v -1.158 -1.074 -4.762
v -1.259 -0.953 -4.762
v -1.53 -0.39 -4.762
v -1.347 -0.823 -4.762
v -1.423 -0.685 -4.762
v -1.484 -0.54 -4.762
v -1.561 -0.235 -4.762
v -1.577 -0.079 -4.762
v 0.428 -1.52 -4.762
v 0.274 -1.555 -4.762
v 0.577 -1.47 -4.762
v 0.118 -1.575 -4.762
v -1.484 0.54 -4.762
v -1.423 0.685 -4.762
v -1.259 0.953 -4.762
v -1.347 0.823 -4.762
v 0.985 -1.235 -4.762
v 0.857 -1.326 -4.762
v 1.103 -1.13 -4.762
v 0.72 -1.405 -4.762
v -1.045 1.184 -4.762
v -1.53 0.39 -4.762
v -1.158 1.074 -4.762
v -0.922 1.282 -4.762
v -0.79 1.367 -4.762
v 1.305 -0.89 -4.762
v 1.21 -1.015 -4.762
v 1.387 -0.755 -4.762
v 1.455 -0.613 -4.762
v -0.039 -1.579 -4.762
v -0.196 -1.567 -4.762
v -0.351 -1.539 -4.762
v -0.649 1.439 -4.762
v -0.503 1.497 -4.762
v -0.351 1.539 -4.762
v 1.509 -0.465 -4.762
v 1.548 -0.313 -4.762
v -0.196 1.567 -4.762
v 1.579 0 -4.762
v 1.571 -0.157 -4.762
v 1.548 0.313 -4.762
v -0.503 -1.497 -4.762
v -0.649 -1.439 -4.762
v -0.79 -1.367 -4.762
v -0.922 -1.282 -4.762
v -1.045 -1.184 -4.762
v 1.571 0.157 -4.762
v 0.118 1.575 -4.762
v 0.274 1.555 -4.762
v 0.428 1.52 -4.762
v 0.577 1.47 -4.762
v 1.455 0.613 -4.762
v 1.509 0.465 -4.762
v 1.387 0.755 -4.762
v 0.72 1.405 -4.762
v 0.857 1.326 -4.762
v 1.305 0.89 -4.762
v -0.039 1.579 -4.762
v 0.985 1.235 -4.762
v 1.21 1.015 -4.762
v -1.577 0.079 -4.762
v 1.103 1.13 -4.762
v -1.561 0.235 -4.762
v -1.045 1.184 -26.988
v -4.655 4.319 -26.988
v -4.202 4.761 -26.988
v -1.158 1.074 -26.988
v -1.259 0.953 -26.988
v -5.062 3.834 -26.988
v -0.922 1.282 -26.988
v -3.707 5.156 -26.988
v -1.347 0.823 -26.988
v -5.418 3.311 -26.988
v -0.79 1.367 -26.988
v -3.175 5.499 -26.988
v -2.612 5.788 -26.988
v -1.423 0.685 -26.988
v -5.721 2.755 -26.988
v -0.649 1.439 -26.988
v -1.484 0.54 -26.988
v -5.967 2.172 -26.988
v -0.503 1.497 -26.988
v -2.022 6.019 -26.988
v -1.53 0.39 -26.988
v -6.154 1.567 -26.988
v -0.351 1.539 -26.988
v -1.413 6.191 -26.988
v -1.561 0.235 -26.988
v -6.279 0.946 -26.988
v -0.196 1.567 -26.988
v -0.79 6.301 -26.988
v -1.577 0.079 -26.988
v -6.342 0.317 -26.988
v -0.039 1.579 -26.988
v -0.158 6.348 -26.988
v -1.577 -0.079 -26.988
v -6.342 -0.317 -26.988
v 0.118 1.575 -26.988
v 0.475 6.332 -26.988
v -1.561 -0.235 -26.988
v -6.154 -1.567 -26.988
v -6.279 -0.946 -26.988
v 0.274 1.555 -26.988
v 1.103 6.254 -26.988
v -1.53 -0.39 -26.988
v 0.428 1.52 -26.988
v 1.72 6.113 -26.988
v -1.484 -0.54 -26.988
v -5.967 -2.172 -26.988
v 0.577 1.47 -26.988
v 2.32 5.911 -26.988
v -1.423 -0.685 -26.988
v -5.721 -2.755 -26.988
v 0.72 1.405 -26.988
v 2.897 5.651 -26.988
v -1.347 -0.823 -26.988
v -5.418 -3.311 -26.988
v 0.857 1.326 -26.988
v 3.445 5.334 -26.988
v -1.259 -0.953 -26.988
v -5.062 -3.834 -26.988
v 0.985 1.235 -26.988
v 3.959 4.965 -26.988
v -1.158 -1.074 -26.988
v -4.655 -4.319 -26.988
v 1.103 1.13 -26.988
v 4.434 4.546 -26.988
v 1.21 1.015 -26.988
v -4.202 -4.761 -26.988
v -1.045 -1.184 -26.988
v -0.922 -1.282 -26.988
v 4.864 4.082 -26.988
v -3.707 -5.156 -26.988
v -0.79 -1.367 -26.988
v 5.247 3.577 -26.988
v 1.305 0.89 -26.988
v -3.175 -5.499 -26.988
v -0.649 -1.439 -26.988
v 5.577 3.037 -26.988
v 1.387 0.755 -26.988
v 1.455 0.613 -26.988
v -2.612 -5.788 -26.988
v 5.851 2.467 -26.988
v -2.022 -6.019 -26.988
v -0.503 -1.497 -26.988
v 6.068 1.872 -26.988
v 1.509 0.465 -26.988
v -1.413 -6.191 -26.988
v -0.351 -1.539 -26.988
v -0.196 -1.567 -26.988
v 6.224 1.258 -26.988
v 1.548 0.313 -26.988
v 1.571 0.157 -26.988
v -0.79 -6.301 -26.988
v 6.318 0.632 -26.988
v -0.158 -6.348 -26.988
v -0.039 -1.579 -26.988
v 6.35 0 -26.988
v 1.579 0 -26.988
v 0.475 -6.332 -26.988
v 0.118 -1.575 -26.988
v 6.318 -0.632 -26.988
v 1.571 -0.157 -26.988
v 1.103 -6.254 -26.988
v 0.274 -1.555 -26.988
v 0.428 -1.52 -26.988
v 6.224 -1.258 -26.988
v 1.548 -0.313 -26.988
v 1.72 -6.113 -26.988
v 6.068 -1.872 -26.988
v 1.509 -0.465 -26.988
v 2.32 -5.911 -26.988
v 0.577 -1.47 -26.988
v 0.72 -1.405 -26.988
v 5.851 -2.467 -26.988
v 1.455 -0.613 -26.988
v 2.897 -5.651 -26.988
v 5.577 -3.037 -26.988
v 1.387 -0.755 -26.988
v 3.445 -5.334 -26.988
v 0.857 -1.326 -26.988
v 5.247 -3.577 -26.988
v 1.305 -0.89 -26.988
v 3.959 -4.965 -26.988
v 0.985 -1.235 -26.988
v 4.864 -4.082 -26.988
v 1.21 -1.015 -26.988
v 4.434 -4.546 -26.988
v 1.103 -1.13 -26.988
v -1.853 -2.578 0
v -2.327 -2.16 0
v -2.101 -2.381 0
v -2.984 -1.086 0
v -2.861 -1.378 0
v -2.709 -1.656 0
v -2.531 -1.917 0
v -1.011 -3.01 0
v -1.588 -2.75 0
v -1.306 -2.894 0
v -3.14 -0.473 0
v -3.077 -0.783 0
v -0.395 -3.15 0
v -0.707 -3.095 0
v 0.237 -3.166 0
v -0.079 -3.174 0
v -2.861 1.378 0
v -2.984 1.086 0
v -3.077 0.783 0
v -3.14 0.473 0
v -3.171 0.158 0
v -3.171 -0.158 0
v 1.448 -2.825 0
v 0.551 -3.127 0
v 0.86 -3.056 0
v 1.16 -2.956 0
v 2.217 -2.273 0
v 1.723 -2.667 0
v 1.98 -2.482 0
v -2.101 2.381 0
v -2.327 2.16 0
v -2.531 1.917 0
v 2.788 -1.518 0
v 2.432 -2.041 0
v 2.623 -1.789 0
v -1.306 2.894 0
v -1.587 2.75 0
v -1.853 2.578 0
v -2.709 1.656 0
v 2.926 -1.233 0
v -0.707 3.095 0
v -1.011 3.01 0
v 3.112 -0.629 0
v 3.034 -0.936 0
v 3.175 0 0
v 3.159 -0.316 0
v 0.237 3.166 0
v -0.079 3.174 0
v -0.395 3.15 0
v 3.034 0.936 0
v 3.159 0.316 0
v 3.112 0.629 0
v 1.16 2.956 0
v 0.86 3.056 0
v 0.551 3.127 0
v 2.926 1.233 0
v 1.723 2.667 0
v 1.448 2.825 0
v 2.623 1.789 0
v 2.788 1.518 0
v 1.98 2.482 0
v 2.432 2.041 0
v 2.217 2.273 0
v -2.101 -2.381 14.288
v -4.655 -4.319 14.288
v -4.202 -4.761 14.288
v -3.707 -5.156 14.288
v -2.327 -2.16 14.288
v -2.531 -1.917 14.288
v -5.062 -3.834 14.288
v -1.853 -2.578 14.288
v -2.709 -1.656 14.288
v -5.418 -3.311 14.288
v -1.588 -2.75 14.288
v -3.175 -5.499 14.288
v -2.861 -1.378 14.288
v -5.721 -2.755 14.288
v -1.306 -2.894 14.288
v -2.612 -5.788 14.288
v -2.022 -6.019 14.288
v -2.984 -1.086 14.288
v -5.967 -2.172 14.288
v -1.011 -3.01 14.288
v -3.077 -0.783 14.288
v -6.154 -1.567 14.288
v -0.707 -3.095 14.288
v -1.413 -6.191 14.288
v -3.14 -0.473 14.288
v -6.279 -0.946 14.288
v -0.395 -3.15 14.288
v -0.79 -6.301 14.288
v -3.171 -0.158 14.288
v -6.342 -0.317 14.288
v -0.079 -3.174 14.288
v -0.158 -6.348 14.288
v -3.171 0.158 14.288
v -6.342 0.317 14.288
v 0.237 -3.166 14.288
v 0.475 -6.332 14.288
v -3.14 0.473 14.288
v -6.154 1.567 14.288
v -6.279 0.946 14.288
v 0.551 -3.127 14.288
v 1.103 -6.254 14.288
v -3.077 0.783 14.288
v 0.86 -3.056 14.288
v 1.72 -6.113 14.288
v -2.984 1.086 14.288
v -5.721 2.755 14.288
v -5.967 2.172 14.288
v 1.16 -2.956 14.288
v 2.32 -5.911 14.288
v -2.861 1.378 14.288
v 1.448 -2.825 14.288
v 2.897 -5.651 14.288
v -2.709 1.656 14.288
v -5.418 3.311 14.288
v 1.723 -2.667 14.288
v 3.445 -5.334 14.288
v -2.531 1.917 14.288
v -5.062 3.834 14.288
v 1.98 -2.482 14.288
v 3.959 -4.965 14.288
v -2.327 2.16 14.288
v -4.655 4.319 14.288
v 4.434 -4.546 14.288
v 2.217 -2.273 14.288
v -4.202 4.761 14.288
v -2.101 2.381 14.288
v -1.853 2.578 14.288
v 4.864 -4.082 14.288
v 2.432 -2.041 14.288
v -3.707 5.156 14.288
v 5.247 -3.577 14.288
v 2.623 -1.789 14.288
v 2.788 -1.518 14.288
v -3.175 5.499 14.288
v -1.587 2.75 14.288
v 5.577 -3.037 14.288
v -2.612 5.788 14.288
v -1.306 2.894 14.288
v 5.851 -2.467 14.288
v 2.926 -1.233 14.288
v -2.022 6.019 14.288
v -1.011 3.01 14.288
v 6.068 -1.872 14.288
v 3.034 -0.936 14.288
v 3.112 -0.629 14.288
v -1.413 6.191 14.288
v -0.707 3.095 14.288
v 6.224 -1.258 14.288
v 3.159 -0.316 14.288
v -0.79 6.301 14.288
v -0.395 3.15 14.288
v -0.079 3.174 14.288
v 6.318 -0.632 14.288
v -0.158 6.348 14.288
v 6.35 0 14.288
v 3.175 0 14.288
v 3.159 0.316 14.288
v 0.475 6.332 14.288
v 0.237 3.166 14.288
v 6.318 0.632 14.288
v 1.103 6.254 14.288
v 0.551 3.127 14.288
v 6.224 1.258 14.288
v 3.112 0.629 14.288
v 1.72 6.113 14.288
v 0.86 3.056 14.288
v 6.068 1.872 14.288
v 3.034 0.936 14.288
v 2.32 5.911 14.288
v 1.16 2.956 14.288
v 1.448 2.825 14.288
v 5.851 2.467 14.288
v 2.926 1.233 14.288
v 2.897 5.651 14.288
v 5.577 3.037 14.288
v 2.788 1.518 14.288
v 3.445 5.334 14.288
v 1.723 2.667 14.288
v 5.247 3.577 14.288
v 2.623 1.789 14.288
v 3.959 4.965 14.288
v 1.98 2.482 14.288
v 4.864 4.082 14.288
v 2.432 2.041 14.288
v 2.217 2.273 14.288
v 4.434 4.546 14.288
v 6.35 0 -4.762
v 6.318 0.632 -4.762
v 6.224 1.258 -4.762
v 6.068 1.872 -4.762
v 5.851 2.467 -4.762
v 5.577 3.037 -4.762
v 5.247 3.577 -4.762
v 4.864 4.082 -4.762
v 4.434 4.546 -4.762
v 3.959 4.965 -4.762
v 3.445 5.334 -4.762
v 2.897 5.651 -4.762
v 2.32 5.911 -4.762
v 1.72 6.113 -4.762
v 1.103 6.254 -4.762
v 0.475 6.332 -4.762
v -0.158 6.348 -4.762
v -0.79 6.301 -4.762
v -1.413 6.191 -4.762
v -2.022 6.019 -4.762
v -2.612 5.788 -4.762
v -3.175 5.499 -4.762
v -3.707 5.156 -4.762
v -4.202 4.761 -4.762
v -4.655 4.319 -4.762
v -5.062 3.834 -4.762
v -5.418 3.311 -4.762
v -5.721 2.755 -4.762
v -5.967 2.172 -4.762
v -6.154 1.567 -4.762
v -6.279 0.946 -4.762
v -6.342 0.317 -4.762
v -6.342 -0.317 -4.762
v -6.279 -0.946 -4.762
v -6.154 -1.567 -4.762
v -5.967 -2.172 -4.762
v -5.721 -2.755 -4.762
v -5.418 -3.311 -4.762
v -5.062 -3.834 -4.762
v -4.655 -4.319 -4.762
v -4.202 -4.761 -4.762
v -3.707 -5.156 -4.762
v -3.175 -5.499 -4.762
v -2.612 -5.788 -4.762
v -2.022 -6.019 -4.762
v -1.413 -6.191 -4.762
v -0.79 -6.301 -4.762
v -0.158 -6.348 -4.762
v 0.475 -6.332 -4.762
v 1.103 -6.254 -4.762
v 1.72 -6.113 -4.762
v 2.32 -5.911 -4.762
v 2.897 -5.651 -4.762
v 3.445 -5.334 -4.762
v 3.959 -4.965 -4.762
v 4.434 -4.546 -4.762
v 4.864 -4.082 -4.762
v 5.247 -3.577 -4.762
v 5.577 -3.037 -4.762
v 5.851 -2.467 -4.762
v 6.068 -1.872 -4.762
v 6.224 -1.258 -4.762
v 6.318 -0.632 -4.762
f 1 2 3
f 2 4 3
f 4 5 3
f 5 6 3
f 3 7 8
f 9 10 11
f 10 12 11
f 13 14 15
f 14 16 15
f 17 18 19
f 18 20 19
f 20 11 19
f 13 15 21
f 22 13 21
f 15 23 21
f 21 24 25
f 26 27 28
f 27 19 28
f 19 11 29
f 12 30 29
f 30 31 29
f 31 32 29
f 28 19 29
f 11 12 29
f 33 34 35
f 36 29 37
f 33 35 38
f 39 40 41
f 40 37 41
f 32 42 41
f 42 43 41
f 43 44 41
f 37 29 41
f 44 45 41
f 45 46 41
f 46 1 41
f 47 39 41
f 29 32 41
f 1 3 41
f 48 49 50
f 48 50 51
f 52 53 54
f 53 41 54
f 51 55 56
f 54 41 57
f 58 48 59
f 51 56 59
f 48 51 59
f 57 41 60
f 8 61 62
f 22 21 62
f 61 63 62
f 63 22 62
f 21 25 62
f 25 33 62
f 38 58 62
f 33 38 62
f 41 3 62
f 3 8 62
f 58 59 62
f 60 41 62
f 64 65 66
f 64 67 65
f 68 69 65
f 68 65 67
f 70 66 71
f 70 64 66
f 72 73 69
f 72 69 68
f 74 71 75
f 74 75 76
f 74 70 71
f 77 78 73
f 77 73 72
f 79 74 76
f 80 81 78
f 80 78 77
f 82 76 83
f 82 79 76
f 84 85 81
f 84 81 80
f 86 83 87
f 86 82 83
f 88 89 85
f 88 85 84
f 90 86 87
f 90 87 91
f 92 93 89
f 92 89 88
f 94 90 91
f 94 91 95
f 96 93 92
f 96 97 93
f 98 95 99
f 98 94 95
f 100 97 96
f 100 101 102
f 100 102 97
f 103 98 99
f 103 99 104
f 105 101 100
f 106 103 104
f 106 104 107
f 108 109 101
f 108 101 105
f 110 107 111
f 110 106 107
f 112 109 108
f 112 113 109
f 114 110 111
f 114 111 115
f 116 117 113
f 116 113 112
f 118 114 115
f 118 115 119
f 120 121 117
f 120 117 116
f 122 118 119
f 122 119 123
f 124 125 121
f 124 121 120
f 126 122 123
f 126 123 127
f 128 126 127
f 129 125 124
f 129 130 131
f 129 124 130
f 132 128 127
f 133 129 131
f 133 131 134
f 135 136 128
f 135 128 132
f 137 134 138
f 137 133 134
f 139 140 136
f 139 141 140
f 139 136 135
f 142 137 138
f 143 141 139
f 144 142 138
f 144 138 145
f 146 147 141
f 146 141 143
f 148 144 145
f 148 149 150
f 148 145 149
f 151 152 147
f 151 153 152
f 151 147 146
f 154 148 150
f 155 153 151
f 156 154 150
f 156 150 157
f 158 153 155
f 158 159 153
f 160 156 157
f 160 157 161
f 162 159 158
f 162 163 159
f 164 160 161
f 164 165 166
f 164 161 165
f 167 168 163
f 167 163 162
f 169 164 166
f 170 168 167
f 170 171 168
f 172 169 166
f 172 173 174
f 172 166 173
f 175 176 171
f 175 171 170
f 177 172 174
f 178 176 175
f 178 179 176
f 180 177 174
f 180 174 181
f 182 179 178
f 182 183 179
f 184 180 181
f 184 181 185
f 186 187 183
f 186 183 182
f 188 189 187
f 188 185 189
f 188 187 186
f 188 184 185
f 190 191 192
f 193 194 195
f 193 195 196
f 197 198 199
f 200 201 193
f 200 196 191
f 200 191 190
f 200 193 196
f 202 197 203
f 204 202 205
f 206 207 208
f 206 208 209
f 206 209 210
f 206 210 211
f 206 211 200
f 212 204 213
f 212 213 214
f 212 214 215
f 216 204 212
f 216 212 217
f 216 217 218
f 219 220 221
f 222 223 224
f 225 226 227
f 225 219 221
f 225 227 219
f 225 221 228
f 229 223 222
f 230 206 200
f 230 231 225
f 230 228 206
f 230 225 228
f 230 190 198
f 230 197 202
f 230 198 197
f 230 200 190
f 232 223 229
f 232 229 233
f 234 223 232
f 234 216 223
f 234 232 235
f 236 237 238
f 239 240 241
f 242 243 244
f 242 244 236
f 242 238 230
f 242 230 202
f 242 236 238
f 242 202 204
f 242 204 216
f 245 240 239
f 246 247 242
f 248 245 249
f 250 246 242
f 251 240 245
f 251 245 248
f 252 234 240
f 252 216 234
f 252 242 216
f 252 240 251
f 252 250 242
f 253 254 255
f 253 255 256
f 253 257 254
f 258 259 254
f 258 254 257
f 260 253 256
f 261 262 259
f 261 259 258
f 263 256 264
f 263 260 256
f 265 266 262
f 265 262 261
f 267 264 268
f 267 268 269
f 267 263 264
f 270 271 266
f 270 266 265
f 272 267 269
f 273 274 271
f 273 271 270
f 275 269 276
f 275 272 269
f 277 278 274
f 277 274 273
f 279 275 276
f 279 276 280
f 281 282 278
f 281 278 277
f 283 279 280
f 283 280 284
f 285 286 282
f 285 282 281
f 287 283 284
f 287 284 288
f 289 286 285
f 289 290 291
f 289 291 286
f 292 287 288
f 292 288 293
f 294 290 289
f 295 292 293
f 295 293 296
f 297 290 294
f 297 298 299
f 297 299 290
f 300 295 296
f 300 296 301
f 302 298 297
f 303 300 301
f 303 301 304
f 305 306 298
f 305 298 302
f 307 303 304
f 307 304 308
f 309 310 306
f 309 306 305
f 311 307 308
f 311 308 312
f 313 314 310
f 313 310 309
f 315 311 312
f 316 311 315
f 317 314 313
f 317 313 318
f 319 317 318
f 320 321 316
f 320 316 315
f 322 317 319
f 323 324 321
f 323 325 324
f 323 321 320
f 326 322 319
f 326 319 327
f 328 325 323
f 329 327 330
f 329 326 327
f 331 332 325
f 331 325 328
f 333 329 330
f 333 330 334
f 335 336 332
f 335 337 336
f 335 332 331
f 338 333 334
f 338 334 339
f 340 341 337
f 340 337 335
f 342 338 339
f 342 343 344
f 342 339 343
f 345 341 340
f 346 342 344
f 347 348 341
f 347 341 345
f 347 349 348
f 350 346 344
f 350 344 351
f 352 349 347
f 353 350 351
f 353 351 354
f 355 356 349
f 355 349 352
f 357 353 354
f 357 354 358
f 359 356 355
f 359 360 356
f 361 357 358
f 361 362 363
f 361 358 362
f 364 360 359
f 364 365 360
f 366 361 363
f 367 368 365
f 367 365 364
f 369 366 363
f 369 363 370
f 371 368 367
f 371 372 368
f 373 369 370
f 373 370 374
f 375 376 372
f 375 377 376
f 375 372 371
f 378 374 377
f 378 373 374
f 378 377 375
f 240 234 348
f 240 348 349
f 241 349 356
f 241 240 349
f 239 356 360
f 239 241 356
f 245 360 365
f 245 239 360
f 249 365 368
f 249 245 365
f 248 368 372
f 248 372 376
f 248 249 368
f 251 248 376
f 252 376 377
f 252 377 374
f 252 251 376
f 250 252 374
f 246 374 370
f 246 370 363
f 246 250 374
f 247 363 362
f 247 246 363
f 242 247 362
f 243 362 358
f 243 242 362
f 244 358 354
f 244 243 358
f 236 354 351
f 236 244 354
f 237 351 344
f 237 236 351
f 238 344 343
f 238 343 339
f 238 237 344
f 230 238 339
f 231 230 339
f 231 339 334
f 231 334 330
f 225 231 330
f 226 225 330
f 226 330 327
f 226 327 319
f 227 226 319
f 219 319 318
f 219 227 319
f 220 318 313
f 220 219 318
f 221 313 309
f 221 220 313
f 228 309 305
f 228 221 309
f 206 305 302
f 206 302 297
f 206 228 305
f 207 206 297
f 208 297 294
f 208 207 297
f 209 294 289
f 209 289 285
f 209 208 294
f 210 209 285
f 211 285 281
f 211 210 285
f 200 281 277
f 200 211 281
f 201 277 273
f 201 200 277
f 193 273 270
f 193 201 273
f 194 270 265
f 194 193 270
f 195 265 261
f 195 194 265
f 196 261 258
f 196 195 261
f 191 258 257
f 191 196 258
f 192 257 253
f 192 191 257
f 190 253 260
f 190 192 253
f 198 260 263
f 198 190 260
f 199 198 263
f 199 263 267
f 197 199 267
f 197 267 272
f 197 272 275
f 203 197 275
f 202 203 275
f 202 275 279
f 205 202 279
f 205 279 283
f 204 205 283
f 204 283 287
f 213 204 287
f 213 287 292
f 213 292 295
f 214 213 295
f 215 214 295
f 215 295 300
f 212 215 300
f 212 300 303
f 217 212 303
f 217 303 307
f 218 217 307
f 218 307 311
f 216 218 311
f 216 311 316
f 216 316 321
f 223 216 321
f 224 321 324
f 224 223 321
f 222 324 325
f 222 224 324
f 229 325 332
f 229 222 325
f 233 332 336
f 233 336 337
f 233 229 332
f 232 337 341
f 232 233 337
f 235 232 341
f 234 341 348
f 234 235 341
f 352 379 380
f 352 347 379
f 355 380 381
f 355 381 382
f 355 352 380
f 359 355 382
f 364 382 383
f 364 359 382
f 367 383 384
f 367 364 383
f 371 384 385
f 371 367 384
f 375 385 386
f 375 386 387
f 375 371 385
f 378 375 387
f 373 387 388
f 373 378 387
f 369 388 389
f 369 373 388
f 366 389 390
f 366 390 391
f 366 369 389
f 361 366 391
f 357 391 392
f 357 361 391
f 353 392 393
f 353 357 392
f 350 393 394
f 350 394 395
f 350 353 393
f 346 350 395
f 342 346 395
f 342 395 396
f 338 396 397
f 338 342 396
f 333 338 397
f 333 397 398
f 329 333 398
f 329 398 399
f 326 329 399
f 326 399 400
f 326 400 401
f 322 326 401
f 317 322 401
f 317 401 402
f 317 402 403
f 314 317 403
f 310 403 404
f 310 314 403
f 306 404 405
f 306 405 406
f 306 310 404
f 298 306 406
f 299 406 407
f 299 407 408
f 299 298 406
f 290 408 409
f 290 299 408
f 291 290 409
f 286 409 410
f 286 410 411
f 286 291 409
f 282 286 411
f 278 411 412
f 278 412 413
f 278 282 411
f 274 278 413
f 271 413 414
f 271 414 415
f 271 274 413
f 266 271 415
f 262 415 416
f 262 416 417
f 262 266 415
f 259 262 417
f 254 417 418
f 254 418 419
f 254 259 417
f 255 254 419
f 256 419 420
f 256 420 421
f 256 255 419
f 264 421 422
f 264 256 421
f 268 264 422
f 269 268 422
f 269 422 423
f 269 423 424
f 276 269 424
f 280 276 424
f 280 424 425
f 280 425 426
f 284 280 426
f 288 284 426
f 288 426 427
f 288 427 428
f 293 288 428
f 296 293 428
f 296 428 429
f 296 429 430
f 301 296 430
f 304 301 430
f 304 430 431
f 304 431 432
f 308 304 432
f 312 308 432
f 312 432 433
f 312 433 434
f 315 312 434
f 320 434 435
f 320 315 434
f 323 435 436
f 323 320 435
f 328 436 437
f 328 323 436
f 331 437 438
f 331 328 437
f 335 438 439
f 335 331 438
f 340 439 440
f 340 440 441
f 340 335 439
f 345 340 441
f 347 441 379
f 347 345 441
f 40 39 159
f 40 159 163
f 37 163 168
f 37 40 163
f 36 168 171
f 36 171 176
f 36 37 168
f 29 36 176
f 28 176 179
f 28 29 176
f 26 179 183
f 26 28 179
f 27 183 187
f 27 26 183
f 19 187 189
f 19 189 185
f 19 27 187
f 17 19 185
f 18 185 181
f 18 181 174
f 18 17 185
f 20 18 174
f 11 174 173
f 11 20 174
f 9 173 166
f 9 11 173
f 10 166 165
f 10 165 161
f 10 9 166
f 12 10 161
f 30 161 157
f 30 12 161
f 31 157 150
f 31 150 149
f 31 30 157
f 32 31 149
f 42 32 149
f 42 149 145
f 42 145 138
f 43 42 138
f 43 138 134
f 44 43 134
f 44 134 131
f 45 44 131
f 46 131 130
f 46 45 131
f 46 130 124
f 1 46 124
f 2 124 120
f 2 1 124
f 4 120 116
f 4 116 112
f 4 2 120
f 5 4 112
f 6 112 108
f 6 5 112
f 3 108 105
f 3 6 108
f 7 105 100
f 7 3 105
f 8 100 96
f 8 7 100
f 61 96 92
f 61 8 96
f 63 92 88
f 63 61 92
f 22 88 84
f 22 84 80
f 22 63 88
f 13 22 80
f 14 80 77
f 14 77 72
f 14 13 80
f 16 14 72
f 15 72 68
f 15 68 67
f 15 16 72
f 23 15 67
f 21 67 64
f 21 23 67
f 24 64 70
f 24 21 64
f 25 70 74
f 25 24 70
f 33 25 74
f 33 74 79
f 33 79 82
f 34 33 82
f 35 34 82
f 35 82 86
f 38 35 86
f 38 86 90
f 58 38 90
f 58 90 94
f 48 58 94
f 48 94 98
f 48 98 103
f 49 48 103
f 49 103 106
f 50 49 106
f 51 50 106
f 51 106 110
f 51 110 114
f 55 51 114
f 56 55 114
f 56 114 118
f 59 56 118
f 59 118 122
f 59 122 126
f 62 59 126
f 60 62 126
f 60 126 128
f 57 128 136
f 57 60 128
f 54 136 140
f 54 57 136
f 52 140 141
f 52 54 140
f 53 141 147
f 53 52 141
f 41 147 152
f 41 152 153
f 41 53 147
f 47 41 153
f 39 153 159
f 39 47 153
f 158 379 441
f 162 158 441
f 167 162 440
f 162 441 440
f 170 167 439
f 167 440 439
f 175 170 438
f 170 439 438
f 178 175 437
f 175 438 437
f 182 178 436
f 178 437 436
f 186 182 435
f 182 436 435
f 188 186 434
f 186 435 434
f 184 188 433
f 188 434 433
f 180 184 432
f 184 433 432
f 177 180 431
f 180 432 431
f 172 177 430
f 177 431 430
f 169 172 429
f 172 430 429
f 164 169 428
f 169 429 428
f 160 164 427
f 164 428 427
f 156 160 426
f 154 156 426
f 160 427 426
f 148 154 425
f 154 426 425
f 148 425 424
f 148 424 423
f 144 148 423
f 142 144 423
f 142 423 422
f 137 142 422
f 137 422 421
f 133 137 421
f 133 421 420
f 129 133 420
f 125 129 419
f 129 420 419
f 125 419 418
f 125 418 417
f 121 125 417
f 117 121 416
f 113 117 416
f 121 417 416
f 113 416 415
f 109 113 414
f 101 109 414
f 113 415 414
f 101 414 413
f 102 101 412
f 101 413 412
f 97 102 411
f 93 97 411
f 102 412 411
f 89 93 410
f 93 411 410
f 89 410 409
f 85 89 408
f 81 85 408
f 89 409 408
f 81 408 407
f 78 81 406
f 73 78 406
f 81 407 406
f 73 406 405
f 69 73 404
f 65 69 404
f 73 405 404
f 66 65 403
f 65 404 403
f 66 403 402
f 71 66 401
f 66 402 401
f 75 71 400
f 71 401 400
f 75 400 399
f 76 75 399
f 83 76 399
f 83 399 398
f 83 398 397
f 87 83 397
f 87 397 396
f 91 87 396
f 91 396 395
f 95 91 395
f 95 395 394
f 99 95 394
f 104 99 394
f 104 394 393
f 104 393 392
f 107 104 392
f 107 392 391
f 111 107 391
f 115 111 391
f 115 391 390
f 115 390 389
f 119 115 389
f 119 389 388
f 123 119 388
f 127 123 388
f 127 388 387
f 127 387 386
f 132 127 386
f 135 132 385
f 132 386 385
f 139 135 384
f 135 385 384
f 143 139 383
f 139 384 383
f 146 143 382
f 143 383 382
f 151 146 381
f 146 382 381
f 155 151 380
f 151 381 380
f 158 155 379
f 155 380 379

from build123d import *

# Parameters (mm, degrees)
F0_R     = 6.35
F0_R_2   = 3.175
F1_DEPTH = 14.2875
F2_R     = 6.35
F3_DEPTH = 4.7625
F4_R     = 6.35
F4_R_2   = 1.579033
F5_DEPTH = 22.225


with BuildPart() as f1:
    # F0 (on Top) → F1 (new body)
    with BuildSketch(Plane.XY):
        Circle(F0_R)
        Circle(F0_R_2, mode=Mode.SUBTRACT)
    extrude(amount=F1_DEPTH)

    # F2 (on face) → F3 (join)
    with BuildSketch(Plane.XY):
        Circle(F2_R)
    extrude(amount=-F3_DEPTH)

    # F4 (on face) → F5 (join)
    with BuildSketch(Plane(origin=(0, 0, -4.7625), x_dir=(1, 0, 0), z_dir=(0, 0, -1))):
        Circle(F4_R)
        Circle(F4_R_2, mode=Mode.SUBTRACT)
    extrude(amount=F5_DEPTH)


solid = f1.part
